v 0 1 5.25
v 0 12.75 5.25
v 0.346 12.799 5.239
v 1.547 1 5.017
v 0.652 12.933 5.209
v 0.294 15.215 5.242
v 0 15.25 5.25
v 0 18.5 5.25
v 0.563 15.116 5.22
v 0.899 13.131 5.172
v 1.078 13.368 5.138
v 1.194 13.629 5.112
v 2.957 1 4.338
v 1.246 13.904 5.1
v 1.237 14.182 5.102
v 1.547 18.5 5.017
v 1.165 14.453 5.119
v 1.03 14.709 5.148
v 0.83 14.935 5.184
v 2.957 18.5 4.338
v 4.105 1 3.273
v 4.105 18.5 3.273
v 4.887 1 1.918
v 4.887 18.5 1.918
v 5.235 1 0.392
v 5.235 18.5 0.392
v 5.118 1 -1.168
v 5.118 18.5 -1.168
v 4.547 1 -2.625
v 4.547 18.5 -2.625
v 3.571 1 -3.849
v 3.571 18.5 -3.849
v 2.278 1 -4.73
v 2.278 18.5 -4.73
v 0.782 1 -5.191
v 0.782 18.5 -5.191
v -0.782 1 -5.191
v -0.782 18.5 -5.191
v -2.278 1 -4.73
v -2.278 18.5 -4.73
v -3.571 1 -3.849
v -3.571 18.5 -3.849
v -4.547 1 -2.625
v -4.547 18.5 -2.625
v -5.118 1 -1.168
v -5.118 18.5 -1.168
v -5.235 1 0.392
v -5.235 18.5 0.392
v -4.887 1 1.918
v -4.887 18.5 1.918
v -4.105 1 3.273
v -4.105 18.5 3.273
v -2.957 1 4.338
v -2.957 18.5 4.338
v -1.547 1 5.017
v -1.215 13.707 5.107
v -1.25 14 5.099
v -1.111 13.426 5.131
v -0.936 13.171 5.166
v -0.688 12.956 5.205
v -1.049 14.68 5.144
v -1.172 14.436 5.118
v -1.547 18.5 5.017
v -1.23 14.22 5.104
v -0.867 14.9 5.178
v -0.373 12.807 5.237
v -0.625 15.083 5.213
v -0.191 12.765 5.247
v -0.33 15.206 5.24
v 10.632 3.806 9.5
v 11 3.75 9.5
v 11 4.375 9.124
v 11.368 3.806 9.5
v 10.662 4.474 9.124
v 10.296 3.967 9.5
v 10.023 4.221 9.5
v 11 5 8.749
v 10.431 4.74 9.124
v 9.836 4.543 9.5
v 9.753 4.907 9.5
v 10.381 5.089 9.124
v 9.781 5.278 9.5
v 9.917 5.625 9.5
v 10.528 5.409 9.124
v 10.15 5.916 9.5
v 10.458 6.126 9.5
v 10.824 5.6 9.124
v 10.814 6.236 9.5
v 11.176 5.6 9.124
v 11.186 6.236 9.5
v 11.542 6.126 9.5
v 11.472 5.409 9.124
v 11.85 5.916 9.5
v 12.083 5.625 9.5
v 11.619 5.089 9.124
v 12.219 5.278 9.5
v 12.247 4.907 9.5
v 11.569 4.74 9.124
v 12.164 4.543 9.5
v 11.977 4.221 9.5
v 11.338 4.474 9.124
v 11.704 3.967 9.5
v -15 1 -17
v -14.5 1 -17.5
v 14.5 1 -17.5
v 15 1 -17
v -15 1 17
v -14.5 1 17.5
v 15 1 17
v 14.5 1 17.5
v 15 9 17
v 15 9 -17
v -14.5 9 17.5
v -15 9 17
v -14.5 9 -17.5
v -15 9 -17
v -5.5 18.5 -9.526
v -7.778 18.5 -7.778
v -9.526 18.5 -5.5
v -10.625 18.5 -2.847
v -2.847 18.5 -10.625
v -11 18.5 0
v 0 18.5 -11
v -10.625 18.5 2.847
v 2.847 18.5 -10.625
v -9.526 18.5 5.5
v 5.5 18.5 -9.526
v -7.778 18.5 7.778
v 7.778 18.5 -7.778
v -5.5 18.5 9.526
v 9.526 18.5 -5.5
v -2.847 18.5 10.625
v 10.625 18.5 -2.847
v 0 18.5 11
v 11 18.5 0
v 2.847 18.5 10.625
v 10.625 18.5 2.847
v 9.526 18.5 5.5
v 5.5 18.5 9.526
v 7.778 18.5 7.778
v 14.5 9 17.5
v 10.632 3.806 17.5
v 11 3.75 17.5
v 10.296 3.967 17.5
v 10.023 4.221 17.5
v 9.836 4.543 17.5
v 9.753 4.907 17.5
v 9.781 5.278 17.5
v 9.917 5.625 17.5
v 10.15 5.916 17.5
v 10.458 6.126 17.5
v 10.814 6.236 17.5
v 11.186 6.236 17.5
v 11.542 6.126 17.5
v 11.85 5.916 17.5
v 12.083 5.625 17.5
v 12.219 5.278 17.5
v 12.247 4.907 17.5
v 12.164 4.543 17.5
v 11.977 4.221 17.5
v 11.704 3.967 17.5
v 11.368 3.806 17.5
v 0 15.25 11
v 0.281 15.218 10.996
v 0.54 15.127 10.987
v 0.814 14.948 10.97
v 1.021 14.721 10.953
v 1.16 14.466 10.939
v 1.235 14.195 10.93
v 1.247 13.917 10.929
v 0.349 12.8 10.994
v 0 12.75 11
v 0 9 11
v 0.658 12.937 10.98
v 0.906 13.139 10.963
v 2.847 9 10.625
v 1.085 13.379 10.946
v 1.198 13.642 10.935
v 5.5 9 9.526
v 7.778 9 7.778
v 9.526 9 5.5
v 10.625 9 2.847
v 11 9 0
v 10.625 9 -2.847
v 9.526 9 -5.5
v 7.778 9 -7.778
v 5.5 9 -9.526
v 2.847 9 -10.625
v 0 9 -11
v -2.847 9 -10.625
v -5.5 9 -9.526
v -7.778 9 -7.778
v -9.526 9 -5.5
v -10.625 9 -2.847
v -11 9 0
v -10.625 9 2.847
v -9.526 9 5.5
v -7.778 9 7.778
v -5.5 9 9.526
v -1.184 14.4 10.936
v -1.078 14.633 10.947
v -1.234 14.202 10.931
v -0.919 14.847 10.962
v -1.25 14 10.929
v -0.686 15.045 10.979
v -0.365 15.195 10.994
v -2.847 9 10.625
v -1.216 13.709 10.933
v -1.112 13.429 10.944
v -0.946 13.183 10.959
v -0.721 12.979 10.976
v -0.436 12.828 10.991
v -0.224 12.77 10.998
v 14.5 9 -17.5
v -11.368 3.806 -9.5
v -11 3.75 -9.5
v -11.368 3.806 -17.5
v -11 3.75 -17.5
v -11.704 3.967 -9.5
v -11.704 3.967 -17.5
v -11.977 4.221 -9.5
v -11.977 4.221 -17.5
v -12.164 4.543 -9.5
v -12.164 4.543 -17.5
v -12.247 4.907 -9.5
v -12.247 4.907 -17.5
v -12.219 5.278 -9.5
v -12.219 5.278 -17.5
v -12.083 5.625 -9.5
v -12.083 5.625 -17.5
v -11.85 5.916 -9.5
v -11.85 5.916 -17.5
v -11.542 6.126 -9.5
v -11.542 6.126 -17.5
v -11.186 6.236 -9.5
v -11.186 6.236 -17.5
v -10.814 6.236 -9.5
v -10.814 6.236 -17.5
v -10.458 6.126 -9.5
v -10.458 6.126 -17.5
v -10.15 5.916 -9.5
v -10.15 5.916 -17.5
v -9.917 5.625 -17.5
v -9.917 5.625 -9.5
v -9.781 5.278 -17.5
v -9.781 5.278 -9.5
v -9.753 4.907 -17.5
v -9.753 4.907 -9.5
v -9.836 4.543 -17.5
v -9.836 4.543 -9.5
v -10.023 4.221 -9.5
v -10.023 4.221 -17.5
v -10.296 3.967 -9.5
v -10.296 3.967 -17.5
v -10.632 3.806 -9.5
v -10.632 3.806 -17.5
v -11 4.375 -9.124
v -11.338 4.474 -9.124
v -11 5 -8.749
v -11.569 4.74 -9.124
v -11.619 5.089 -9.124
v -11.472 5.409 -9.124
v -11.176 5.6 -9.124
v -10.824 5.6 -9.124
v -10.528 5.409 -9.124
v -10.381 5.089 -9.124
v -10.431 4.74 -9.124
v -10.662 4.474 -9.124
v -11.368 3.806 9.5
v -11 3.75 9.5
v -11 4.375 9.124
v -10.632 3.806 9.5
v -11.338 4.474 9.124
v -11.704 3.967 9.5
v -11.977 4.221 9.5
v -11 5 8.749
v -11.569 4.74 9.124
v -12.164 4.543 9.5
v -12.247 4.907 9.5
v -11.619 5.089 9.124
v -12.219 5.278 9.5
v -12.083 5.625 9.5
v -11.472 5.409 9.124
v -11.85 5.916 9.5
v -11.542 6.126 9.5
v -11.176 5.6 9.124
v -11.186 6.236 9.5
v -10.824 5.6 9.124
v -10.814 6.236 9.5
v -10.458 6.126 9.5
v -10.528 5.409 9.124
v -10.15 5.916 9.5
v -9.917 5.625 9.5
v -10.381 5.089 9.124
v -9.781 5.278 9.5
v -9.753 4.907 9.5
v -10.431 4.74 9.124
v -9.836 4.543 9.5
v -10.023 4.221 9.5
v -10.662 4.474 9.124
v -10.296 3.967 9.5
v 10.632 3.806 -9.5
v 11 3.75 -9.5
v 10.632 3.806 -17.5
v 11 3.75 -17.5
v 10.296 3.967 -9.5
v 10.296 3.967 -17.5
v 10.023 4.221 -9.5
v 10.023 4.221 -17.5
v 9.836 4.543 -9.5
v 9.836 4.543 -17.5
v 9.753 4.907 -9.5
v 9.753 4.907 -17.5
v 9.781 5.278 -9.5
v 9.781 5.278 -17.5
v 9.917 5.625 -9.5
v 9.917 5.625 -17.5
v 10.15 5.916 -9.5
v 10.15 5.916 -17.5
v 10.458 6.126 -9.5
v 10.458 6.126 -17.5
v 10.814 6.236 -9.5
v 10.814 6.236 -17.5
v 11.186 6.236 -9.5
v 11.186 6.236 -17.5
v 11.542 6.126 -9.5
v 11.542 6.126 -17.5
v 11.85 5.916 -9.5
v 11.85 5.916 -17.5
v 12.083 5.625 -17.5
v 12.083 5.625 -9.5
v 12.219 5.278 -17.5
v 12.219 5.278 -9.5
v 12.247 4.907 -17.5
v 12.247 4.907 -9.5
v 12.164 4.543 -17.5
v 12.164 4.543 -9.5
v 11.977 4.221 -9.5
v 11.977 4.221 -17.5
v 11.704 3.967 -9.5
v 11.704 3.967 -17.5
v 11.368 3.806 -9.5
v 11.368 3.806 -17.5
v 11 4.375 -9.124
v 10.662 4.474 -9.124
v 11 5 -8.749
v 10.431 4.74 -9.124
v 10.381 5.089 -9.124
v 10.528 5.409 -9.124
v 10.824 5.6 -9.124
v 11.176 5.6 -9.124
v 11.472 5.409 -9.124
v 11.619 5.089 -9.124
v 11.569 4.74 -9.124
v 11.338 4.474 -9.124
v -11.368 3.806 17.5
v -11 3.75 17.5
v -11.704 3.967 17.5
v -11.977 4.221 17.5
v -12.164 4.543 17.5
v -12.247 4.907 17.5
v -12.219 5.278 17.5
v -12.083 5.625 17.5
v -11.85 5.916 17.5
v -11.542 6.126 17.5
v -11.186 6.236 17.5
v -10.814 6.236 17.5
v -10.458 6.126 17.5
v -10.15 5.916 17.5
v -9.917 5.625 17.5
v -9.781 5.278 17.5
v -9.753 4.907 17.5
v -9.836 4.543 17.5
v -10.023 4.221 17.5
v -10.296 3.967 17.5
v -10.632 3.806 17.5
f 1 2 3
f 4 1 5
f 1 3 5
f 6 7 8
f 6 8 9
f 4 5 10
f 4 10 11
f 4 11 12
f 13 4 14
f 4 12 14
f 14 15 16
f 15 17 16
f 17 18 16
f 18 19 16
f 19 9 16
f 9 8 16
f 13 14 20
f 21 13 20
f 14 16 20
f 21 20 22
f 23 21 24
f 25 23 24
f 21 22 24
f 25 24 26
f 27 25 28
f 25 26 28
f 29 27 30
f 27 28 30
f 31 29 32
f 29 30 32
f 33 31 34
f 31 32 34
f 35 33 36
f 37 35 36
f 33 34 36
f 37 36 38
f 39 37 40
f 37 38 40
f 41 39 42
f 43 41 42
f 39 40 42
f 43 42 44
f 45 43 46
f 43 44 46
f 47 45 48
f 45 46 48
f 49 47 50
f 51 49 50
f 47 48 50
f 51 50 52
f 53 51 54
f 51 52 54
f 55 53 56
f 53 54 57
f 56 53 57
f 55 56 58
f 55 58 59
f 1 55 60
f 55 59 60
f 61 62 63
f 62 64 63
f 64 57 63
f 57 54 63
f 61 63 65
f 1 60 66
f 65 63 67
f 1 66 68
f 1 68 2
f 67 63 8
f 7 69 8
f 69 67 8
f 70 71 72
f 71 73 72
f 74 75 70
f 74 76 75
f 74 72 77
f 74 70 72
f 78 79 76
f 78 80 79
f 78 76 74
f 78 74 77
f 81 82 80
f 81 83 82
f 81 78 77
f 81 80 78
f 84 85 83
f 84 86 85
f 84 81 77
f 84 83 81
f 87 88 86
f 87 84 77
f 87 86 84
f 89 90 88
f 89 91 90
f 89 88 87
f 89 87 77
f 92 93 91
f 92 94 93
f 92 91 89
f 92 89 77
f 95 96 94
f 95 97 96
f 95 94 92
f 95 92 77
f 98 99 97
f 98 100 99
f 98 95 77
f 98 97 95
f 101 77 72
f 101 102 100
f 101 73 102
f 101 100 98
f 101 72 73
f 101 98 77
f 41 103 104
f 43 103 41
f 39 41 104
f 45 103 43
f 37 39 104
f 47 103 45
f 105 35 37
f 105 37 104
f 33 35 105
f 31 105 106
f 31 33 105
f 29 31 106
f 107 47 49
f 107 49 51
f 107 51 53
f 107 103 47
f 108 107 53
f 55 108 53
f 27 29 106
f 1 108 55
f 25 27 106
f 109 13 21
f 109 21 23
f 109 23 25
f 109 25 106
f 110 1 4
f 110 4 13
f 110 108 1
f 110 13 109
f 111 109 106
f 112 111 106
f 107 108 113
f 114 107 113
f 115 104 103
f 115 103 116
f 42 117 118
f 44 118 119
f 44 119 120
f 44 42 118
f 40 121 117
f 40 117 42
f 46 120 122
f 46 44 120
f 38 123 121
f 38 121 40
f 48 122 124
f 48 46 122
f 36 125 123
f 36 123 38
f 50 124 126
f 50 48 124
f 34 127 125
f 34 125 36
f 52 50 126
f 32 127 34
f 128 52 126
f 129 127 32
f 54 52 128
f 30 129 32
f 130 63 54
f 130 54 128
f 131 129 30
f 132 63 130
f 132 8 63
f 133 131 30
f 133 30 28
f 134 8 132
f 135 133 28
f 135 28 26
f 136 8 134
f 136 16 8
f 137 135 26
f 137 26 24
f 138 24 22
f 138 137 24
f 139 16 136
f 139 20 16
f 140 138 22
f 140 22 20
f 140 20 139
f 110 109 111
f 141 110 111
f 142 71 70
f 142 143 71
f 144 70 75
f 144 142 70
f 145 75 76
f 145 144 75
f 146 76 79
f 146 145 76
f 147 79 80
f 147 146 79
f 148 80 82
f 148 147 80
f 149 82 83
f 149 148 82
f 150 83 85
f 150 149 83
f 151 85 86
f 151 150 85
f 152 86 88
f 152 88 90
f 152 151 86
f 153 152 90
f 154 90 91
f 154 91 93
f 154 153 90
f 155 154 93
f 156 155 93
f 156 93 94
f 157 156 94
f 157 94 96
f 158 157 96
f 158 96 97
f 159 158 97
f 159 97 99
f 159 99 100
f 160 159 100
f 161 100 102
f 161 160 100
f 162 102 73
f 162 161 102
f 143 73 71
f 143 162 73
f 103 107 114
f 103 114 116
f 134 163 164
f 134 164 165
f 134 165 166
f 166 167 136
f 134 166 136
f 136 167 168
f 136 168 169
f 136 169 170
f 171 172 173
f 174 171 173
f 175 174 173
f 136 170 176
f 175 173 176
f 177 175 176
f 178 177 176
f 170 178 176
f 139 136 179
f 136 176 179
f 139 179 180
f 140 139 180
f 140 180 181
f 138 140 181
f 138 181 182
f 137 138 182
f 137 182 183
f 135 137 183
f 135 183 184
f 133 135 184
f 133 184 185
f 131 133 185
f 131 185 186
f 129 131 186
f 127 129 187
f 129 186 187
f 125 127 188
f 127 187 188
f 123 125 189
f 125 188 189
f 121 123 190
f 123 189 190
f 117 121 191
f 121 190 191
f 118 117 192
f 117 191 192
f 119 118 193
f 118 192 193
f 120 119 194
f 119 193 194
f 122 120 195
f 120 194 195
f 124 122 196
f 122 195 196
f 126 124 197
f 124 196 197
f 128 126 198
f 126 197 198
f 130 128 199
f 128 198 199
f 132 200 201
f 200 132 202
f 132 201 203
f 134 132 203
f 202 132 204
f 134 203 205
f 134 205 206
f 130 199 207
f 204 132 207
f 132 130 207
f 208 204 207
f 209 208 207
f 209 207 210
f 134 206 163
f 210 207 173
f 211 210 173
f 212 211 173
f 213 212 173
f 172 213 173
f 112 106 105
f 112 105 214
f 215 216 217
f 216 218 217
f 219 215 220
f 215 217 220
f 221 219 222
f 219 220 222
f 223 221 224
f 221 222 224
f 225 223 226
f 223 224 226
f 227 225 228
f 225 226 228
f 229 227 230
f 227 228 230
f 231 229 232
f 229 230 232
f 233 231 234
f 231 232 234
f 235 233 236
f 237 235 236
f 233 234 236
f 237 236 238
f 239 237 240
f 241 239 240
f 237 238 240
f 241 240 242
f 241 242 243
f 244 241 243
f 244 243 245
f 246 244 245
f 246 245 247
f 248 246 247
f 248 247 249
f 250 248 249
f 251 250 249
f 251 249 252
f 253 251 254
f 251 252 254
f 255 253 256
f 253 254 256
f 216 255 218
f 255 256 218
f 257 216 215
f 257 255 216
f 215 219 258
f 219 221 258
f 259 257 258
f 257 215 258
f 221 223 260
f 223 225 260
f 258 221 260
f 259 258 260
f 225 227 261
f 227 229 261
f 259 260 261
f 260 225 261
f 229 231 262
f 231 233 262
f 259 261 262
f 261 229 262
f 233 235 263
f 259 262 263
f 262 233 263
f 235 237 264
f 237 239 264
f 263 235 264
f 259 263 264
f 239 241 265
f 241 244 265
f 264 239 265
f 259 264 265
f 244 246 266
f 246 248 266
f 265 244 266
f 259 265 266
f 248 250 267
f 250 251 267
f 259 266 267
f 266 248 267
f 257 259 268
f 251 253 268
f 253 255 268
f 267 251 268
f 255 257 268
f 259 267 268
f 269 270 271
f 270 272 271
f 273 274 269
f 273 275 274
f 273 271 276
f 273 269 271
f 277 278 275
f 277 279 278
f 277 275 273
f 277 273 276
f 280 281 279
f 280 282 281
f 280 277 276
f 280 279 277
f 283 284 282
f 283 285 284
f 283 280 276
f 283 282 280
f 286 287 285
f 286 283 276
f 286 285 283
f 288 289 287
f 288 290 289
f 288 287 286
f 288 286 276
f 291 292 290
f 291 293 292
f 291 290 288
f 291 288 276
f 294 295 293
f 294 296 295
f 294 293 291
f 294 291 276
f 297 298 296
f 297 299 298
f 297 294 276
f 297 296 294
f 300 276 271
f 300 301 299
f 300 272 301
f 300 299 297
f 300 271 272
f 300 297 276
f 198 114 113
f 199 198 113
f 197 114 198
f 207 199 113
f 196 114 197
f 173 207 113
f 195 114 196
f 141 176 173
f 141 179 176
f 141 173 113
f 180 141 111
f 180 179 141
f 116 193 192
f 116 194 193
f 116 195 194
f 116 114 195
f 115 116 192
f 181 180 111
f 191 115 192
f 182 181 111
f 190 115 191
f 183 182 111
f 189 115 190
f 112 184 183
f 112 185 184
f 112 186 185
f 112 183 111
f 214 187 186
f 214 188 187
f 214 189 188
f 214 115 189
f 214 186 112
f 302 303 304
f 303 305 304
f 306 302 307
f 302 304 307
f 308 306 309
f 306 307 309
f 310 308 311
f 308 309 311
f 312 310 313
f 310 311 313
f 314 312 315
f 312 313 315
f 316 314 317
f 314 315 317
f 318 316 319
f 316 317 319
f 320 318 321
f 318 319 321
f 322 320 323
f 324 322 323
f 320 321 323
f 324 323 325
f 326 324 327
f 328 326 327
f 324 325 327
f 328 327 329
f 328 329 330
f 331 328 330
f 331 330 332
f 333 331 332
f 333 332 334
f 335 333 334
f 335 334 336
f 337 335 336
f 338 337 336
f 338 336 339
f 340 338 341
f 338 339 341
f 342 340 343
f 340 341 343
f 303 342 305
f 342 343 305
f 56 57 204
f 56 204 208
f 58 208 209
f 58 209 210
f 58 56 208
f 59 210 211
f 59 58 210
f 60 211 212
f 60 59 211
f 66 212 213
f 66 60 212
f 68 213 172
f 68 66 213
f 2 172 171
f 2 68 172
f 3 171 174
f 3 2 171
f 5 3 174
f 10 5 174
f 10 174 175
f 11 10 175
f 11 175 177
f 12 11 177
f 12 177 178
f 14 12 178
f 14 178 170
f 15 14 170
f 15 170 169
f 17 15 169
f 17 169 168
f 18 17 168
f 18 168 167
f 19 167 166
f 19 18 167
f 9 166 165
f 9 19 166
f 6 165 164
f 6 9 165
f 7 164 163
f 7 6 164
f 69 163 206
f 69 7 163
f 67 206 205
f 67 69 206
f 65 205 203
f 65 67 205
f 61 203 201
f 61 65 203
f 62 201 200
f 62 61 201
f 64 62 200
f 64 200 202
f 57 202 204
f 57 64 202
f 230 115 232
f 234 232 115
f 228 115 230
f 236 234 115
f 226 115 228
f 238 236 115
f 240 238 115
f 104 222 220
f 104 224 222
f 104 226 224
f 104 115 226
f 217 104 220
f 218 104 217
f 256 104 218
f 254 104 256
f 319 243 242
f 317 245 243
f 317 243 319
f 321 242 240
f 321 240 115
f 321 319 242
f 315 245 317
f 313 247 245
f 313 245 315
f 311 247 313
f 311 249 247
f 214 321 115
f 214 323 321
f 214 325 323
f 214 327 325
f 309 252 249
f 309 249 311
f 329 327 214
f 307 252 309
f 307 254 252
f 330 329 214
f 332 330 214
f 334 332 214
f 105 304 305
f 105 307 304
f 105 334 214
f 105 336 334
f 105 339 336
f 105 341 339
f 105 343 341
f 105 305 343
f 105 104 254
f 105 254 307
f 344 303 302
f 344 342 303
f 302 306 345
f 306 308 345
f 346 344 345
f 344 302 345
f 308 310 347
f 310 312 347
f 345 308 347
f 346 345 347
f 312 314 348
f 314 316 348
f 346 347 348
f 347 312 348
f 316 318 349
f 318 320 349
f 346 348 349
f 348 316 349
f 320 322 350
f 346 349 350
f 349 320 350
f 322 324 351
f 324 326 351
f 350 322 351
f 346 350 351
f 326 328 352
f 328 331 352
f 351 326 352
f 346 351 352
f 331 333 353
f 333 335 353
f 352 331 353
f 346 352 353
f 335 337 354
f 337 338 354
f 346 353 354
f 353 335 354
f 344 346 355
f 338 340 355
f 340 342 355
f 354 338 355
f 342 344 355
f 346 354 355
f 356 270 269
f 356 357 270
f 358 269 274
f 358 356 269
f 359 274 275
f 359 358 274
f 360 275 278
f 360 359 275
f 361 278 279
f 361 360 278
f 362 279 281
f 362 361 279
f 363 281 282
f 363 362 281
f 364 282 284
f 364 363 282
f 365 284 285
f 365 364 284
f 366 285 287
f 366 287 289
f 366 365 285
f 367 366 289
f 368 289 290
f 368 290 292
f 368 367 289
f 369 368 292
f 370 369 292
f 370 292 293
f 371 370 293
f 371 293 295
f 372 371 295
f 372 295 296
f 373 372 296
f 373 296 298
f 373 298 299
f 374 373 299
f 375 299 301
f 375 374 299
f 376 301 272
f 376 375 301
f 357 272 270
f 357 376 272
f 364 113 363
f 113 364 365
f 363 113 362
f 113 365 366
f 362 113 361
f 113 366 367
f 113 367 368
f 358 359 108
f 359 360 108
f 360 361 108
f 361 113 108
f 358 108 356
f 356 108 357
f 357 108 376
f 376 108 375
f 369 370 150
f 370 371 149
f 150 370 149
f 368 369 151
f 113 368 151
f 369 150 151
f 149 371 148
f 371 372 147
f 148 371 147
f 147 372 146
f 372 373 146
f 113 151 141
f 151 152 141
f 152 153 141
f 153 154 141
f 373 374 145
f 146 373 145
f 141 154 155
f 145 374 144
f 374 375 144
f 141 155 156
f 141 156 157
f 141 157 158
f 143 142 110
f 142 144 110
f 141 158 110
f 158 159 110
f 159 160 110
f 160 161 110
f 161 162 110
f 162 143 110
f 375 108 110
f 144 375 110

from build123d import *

# Parameters (mm, degrees)
SKETCH_1_W                  = 30
SKETCH_1_H                  = 35
EXTRUDE_1_DEPTH             = 10
SKETCH_3_R                  = 11
SKETCH_3_R_2                = 5.25
EXTRUDE_2_DEPTH             = 8.5
CHAMFER_1_SIZE              = 0.5
SKETCH_6_R                  = 5.25
CUT_EXTRUDE_3_DEPTH         = 30.555033412
SKETCH_7_W                  = 31.194113832
SKETCH_7_H                  = 36.870983812
CUT_EXTRUDE_4_DEPTH         = 1
CUT_EXTRUDE_START           = -1
SKETCH_8_W                  = 33.487798672
SKETCH_8_H                  = 37.788457748
SKETCH_8_R                  = 11
CUT_EXTRUDE_5_DEPTH         = 1
HOLE_WIZARD_M3_1_AT_2_COUNT = 2
HOLE_WIZARD_M3_1_AT_2_PITCH = 22
SKETCH_4_R                  = 1.25
CUT_EXTRUDE_6_DEPTH         = 30.555033412


with BuildPart() as part:
    # 草图1 → 凸台-拉伸1 (new body)
    with BuildSketch(Plane(origin=(0, 0, 0), x_dir=(1, 0, 0), z_dir=(0, 1, 0))):
        Rectangle(SKETCH_1_W, SKETCH_1_H)
    extrude(amount=EXTRUDE_1_DEPTH)

    # 草图3 → 凸台-拉伸2 (add)
    with BuildSketch(Plane(origin=(0, 10, 0), x_dir=(1, 0, 0), z_dir=(0, 1, 0))):
        with Locations(Location((0, 0, 0), (0, 0, 270))):
            Circle(SKETCH_3_R)
        with Locations(Location((0, 0, 0), (0, 0, 270))):
            Circle(SKETCH_3_R_2, mode=Mode.SUBTRACT)
    extrude(amount=EXTRUDE_2_DEPTH)

    # 倒角1
    chamfer_1_edges = [part.edges().sort_by_distance(p)[0] for p in [
        (15, 5, 17.5),
        (-15, 5, 17.5),
        (-15, 5, -17.5),
        (15, 5, -17.5),
    ]]
    chamfer(chamfer_1_edges, length=CHAMFER_1_SIZE)

    # 草图6 → 切除-拉伸3 (cut, through all)
    with BuildSketch(Plane(origin=(0, 18.5, 0), x_dir=(1, 0, 0), z_dir=(0, 1, 0))):
        with Locations(Location((0, 0, 0), (0, 0, 270))):
            Circle(SKETCH_6_R)
    extrude(amount=-CUT_EXTRUDE_3_DEPTH, mode=Mode.SUBTRACT)

    # 草图7 → 切除-拉伸4 (cut)
    with BuildSketch(Plane.XZ):
        Rectangle(SKETCH_7_W, SKETCH_7_H)
    extrude(amount=-CUT_EXTRUDE_4_DEPTH, mode=Mode.SUBTRACT)

    # 草图8 → 切除-拉伸5 (cut)
    with BuildSketch(Plane(origin=(0, 10, 0), x_dir=(1, 0, 0), z_dir=(0, 1, 0)).offset(CUT_EXTRUDE_START)):
        Rectangle(SKETCH_8_W, SKETCH_8_H)
        with Locations(Location((0, 0, 0), (0, 0, 270))):
            Circle(SKETCH_8_R, mode=Mode.SUBTRACT)
    extrude(amount=CUT_EXTRUDE_5_DEPTH, mode=Mode.SUBTRACT)

    # 草图9 → M3 螺纹孔1 (revolve, cut)
    with BuildSketch(Plane(origin=(-11, 5, 17.5), x_dir=(0, -1, 0), z_dir=(1, 0, 0))):
        Polygon((0, 0), (0, 8.751075774), (1.25, 8), (1.25, 0), align=None)
    hole_wizard_m3_1 = revolve(axis=Axis((-11, 5, 23.85), (0, 0, -1)), mode=Mode.SUBTRACT)

    # M3 螺纹孔1 at 2: M3 螺纹孔1 ×2
    with Locations(*[(i * HOLE_WIZARD_M3_1_AT_2_PITCH, 0, 0) for i in range(1, HOLE_WIZARD_M3_1_AT_2_COUNT)]):
        add(hole_wizard_m3_1, mode=Mode.SUBTRACT)

    # 镜向1: M3 螺纹孔1 across plane
    add(hole_wizard_m3_1.mirror(Plane.XY), mode=Mode.SUBTRACT)

    # 镜向1 copy 1 sketch → 镜向1 copy 1 (revolve, cut)
    with BuildSketch(Plane(origin=(11, 5, -17.5), x_dir=(0, -1, 0), z_dir=(1, 0, 0))):
        Polygon((0, 0), (0, -8.751075774), (1.25, -8), (1.25, 0), align=None)
    revolve(axis=Axis((11, 5, -23.85), (0, 0, -1)), mode=Mode.SUBTRACT)

    # 草图4 → 切除-拉伸6 (cut, through all)
    with BuildSketch(Plane.XY):
        with Locations(Location((0, 14, 0), (0, 0, 180))):
            Circle(SKETCH_4_R)
    extrude(amount=CUT_EXTRUDE_6_DEPTH, mode=Mode.SUBTRACT)


solid = part.part
